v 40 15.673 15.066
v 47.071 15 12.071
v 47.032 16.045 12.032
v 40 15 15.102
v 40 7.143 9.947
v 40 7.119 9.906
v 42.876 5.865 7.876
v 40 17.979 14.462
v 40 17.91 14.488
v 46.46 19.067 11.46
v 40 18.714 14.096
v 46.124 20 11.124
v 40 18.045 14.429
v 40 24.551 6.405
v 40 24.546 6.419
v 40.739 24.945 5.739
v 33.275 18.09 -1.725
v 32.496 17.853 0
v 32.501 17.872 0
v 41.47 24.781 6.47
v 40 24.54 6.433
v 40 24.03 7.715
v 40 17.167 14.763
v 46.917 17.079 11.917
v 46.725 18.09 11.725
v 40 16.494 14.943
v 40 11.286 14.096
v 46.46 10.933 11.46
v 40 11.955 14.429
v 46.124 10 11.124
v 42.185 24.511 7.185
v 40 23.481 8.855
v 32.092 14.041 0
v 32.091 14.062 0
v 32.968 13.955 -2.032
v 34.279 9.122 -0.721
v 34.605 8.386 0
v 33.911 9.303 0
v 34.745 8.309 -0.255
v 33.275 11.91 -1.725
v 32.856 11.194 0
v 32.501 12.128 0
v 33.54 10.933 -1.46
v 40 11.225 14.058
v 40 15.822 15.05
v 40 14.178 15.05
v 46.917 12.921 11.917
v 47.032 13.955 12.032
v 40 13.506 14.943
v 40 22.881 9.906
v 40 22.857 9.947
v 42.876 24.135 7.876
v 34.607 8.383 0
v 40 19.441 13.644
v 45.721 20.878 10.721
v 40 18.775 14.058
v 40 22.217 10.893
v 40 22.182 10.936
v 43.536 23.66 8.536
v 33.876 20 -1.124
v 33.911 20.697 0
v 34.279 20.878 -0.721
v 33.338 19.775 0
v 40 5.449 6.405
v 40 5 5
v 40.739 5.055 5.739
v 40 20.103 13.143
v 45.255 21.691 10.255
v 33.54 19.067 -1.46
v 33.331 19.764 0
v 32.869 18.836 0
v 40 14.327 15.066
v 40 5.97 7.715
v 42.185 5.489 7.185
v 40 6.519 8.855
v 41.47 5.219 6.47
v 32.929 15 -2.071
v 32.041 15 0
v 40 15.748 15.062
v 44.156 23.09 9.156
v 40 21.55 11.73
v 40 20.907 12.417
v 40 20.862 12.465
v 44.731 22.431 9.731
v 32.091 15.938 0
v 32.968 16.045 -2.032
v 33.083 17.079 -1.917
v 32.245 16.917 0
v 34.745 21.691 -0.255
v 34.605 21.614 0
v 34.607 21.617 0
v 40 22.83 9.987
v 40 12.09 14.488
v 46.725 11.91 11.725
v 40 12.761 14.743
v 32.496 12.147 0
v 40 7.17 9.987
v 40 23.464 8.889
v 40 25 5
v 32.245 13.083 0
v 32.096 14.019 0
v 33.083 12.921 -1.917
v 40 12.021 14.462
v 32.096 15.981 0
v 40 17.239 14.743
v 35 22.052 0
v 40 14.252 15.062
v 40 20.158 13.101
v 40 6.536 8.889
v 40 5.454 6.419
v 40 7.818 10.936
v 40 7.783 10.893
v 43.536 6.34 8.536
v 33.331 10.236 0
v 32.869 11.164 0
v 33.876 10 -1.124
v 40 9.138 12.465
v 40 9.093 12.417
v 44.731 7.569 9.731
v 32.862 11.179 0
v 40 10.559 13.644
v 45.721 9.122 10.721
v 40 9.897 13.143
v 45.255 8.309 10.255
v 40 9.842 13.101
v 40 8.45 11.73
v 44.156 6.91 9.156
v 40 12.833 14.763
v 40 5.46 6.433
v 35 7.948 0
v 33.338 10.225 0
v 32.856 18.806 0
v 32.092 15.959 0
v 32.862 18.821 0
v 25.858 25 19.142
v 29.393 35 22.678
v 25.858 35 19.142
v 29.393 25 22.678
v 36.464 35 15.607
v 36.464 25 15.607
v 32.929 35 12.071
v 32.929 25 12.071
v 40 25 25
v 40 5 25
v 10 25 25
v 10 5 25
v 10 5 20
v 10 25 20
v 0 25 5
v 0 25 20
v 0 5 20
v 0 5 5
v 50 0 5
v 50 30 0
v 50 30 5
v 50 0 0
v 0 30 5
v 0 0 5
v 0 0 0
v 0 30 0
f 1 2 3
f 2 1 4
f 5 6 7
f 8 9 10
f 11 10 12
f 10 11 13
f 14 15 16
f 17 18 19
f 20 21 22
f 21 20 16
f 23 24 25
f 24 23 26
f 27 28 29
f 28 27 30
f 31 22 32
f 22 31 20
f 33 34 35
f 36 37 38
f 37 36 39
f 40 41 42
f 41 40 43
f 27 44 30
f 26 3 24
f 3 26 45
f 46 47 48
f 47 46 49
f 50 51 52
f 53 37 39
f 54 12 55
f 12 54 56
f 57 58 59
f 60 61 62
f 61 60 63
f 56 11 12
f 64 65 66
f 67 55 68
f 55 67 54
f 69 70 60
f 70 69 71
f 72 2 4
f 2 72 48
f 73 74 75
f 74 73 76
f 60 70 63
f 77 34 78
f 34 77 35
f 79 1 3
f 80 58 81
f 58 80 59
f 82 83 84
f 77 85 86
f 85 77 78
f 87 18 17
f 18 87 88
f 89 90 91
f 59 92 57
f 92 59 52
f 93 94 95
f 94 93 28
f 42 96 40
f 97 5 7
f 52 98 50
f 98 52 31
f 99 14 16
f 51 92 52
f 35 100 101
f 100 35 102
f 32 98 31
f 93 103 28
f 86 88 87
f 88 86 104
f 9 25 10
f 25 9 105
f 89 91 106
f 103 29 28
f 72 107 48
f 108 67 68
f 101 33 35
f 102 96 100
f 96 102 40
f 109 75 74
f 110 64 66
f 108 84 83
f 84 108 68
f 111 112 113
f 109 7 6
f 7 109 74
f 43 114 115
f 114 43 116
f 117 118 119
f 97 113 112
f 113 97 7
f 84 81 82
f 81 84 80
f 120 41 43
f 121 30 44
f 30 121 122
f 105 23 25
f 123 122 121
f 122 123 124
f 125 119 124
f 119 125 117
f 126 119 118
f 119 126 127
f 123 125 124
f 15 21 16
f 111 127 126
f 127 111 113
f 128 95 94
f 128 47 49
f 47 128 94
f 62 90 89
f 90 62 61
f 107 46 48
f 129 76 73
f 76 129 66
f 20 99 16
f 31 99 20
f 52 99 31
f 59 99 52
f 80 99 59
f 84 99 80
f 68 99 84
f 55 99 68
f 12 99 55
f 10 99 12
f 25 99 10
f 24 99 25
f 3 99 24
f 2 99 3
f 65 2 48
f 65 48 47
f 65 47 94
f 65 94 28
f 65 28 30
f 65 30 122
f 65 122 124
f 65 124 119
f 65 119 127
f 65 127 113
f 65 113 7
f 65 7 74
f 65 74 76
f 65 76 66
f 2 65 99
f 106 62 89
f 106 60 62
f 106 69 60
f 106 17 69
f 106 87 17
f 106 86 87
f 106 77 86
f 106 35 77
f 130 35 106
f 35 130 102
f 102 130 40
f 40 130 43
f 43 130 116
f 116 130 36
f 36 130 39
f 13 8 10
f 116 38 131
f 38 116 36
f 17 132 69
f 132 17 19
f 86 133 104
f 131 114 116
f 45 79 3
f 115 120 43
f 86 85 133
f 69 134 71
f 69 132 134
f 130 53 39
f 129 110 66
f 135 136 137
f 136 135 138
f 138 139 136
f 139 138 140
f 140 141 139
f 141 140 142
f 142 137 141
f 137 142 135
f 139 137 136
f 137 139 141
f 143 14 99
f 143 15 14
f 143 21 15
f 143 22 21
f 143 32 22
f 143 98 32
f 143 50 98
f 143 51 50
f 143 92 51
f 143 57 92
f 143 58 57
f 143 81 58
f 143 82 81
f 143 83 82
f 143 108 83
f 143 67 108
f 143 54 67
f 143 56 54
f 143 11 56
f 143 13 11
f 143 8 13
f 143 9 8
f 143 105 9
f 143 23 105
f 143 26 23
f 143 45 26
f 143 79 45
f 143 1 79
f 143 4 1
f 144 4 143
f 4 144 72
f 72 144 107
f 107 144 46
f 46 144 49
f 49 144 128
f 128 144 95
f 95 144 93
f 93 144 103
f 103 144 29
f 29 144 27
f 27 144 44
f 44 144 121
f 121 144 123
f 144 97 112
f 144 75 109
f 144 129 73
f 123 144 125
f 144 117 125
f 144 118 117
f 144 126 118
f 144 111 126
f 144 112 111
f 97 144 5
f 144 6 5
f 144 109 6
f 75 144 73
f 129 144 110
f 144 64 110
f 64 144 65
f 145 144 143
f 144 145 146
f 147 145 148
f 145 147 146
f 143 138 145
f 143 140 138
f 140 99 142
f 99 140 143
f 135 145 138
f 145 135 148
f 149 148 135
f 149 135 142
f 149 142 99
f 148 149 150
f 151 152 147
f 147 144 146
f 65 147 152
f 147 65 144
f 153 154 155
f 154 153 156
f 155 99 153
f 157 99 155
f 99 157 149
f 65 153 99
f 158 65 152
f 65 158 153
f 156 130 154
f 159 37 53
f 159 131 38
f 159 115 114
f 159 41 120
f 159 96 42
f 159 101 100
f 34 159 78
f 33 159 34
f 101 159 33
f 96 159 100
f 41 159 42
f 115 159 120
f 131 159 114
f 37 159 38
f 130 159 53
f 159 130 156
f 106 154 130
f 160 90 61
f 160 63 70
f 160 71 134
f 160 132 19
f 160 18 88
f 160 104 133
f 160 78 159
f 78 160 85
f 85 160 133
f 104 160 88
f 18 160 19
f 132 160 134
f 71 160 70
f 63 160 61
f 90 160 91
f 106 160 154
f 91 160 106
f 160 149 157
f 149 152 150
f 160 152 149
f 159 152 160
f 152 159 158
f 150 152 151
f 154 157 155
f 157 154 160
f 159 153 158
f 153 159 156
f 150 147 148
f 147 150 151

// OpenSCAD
$fn = 60;

module anvil_base() {
    cube([50, 30, 5]);
}

module anvil_body() {
    translate([10, 5, 5]) {
        cube([30, 20, 20]);
    }
}

module anvil_horn() {
    translate([40, 15, 5]) {
        rotate([0, -45, 0]) {
            union() {
                cylinder(h = 20, r1 = 10, r2 = 2, $fn = 60);
                translate([0, 0, 10]) {
                    cube([5, 20, 10]);
                }
            }
        }
    }
}

module anvil_heel() {
    translate([0, 5, 5]) {
        cube([10, 20, 15]);
    }
}

module anvil_text() {
    translate([40, -0.1, 15]) { // Adjusted Y for embossing, Z for vertical centering
        rotate([90, 0, 90]) {
            linear_extrude(height = 2) {
                text("PYCON 2026", size = 8, font = "Sans:style=Bold");
            }
        }
    }
}

union() {
    anvil_base();
    anvil_body();
    anvil_horn();
    anvil_heel();
    difference() {
        anvil_body();
        anvil_text();
    }
}
